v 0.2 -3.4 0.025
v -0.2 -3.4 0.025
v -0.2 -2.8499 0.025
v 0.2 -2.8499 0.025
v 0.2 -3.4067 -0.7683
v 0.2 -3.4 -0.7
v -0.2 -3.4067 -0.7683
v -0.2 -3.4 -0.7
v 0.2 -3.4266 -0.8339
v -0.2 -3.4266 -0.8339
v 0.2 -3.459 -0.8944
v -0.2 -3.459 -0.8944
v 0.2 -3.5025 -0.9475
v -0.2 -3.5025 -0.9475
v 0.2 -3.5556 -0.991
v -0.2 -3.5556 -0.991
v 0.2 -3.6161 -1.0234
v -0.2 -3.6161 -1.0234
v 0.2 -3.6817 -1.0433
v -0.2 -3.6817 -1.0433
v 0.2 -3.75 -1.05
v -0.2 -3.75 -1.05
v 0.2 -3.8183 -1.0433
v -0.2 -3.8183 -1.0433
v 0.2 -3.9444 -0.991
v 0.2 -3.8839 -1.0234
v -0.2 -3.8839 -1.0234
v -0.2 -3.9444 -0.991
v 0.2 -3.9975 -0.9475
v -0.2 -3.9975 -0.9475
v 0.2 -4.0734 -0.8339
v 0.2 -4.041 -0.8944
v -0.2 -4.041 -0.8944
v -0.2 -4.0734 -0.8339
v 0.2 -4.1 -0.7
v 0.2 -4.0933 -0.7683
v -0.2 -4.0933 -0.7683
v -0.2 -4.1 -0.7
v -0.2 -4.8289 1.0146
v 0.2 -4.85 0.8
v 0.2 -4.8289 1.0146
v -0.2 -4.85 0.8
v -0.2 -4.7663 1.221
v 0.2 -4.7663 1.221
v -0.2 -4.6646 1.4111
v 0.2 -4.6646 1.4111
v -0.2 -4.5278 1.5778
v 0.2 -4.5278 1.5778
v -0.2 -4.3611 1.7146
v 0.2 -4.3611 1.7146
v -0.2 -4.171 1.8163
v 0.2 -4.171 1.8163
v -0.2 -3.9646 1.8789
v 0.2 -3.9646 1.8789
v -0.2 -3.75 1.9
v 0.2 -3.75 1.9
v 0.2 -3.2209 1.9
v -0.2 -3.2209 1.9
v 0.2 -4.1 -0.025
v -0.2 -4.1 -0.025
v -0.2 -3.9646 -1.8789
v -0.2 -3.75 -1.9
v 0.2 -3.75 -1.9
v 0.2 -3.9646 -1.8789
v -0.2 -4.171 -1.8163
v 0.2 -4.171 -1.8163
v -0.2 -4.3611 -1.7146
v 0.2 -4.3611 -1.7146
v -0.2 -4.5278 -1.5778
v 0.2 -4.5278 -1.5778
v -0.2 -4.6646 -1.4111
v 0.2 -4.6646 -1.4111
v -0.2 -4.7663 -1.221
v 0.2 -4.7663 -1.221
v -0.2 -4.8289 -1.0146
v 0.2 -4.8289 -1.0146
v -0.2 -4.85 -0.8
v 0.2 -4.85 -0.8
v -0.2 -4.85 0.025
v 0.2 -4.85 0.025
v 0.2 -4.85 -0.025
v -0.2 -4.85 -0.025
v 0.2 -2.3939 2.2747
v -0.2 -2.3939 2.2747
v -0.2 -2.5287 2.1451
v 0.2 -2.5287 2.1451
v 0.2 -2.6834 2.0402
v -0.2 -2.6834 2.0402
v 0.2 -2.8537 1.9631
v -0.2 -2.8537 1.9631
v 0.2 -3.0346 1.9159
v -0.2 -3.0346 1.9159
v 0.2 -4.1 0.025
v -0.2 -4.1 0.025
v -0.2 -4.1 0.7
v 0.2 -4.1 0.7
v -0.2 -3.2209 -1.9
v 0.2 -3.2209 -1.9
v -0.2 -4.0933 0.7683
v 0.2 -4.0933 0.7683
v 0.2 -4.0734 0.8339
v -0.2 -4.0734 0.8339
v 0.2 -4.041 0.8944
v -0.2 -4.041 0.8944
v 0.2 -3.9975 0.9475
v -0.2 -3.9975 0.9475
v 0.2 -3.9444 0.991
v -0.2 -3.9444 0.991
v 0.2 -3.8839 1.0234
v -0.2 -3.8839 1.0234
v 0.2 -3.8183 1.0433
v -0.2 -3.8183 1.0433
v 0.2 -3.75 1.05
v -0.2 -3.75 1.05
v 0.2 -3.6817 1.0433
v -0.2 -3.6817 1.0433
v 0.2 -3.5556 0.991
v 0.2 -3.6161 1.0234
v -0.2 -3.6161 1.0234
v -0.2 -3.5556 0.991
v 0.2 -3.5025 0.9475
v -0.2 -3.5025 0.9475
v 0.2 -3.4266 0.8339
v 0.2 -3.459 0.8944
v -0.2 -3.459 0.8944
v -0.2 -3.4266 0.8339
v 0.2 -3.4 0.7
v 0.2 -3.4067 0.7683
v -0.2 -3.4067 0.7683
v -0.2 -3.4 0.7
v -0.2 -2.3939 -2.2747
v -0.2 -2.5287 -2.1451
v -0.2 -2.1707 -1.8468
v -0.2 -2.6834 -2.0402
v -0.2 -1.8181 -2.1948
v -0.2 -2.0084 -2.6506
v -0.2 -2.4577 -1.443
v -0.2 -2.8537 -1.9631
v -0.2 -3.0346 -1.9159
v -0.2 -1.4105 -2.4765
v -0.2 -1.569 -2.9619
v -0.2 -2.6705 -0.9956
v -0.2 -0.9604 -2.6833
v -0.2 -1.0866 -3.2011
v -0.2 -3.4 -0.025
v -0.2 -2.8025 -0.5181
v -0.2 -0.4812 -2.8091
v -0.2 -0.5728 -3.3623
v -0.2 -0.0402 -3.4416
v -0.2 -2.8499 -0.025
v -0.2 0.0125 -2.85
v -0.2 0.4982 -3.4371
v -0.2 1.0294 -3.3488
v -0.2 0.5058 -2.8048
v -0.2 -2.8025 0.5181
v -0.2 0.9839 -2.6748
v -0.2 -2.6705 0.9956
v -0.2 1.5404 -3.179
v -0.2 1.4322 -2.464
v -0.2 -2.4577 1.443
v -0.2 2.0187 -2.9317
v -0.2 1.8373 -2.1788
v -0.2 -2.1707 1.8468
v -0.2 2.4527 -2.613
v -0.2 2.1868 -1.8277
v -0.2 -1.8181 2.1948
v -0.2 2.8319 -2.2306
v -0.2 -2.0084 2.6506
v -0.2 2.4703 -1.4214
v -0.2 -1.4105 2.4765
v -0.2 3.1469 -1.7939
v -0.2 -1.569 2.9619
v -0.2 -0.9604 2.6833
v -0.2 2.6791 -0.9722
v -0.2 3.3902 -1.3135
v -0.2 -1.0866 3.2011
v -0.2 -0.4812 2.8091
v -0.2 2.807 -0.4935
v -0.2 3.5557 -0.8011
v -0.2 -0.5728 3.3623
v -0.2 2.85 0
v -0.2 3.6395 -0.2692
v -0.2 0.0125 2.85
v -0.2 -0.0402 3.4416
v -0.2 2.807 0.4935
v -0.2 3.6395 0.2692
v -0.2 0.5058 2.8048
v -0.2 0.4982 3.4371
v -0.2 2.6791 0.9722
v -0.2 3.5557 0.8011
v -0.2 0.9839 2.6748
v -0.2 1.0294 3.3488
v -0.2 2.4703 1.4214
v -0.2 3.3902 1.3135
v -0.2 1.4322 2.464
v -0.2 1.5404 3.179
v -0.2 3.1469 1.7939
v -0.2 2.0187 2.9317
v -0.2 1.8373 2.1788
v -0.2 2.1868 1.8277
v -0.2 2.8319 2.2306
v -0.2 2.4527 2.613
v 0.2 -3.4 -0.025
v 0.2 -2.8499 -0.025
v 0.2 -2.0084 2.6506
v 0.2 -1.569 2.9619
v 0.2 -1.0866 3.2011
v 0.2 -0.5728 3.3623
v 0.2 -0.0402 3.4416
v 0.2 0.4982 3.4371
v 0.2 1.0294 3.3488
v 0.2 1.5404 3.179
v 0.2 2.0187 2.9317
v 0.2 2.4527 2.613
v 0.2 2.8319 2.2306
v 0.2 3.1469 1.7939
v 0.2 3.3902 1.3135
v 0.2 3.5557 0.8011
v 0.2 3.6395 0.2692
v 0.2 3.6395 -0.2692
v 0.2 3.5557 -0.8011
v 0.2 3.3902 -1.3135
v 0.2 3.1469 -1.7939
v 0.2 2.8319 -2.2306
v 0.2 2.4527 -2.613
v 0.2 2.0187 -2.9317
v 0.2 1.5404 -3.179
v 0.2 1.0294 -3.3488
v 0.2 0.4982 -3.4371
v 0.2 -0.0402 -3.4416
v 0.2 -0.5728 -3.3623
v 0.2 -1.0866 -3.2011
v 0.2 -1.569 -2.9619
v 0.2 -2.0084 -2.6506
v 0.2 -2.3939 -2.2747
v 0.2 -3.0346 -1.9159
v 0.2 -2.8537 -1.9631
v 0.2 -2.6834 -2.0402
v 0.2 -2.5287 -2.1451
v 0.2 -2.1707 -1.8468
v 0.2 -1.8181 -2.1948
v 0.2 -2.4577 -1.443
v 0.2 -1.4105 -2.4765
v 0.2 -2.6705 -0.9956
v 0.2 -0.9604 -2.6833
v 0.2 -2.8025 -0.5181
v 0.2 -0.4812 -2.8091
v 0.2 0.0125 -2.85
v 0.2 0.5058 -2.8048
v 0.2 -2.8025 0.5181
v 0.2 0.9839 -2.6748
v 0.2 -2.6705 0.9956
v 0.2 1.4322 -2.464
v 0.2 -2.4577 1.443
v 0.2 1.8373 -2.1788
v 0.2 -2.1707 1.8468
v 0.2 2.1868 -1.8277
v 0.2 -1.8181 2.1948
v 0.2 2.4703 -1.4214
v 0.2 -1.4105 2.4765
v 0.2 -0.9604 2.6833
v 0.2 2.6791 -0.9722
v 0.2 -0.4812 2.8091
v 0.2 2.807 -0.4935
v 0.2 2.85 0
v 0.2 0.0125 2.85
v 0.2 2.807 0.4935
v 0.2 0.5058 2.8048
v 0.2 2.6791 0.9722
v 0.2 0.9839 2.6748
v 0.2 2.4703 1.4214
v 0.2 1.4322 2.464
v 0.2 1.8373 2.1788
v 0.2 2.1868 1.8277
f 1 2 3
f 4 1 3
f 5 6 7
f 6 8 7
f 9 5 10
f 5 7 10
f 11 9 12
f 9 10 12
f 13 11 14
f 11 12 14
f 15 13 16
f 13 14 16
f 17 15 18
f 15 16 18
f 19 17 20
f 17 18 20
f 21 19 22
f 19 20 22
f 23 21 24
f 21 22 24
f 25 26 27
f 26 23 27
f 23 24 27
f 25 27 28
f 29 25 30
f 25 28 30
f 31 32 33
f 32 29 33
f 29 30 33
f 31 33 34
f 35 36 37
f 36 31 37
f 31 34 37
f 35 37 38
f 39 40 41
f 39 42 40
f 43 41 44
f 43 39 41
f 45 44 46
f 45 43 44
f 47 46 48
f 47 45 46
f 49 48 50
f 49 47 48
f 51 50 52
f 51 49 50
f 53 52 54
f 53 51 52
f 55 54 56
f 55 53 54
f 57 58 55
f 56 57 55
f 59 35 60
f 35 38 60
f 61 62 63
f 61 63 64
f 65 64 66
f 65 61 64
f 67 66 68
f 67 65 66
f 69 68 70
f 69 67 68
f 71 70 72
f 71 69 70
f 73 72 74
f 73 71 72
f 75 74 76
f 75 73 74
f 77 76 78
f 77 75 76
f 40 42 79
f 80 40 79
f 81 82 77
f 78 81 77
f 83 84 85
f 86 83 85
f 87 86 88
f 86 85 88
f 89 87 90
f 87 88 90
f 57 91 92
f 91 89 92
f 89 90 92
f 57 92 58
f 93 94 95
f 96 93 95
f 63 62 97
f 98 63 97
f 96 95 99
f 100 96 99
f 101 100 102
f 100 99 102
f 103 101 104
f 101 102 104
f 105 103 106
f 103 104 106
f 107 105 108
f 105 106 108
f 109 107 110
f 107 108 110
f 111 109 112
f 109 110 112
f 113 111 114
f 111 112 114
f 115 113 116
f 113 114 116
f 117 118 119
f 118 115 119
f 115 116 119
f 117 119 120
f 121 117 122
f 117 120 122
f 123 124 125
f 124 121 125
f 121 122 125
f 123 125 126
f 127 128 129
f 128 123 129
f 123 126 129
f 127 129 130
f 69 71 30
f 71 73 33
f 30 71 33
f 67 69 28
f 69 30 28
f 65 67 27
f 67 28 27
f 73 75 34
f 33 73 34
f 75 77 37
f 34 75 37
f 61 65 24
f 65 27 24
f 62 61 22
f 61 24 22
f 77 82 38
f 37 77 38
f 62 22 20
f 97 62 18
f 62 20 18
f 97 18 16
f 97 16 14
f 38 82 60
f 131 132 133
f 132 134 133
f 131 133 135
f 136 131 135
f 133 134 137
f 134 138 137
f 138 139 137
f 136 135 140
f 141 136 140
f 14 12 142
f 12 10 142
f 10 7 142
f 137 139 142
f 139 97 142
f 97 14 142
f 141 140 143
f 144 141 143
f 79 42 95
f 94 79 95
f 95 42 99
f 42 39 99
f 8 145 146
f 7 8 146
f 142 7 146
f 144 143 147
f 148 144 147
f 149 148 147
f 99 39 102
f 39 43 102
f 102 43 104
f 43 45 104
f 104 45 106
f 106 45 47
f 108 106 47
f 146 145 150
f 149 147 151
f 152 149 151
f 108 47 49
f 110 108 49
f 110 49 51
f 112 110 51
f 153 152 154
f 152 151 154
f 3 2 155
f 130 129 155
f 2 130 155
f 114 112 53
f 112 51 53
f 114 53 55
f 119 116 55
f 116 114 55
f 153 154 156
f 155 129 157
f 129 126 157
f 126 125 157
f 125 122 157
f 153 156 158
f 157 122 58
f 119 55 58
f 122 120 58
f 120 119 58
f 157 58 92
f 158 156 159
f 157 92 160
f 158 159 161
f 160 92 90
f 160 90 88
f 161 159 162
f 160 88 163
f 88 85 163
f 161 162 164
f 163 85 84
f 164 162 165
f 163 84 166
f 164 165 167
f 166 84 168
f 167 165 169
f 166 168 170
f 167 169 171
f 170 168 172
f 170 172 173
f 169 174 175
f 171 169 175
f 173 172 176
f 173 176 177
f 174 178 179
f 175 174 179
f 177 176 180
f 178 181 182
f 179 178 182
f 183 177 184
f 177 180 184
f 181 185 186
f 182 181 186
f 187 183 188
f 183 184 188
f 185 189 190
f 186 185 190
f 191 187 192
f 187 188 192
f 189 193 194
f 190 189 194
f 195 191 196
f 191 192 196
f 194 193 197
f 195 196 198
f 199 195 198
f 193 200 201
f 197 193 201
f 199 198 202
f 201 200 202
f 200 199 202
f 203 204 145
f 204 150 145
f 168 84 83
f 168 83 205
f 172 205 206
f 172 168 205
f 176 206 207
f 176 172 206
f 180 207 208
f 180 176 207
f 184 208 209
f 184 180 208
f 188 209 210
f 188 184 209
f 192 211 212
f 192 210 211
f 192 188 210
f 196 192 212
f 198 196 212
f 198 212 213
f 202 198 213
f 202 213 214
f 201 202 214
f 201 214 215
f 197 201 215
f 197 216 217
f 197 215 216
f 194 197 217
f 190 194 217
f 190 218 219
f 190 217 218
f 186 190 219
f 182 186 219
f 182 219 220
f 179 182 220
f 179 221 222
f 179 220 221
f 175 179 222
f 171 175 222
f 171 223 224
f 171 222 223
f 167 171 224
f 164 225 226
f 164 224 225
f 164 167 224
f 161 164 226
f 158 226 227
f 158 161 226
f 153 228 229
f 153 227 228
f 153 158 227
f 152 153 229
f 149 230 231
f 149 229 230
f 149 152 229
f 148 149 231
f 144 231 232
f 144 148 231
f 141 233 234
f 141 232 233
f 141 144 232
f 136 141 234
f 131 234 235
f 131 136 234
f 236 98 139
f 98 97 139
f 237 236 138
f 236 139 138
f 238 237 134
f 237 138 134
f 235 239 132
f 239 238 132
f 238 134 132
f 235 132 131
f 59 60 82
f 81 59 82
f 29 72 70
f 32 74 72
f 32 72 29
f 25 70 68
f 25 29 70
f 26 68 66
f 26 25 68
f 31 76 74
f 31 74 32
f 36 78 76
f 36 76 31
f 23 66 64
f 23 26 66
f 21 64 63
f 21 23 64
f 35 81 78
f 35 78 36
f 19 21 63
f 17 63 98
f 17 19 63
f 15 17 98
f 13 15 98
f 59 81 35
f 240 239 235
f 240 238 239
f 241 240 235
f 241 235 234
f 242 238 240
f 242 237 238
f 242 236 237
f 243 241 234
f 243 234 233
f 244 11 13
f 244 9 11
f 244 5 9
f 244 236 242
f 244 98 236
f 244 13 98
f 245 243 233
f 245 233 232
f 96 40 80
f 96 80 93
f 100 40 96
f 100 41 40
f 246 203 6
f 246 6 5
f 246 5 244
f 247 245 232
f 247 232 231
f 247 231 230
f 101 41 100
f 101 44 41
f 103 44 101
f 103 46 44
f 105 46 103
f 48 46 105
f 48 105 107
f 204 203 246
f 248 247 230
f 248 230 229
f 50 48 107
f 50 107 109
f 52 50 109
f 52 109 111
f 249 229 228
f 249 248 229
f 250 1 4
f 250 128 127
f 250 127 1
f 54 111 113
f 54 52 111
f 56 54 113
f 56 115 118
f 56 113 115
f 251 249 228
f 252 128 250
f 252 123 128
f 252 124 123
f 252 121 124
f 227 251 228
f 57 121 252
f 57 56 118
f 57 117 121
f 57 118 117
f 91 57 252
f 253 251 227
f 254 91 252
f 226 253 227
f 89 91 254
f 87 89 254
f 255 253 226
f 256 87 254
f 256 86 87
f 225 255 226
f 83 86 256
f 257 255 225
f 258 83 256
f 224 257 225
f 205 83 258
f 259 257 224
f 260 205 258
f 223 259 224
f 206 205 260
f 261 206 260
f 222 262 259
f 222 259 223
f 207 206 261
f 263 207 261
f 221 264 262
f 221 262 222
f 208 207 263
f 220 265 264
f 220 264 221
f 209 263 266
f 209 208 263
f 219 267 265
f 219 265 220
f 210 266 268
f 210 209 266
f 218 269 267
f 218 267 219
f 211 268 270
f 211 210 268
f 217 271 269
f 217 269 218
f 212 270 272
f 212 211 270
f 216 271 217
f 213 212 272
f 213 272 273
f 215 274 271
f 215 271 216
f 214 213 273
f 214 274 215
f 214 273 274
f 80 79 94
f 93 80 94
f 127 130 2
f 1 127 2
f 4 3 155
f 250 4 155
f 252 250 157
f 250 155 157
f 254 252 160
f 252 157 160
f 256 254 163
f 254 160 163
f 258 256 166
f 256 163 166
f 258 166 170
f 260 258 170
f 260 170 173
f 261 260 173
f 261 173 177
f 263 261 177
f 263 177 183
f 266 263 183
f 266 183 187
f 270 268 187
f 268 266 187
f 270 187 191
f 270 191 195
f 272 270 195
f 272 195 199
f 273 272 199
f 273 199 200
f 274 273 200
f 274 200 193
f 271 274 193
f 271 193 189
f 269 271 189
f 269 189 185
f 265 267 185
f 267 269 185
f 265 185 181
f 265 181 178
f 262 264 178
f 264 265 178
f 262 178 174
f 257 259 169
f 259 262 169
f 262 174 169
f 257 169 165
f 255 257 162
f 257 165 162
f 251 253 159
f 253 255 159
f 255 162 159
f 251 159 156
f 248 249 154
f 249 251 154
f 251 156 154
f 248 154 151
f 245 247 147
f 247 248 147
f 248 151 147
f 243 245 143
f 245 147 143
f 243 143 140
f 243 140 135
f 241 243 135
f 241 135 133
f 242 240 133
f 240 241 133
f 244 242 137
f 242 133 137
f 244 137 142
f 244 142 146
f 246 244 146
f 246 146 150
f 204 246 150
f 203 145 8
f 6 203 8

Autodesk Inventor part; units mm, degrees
sketch "Sketch_5" plane through (0, 0, 0) normal (1, 0, 0) x (0, 1, 0)
  arc A0 (-2.3939, -2.2747) -> (-2.3939, 2.2747) centre (0.2, 0) ccw
  arc A1 (-3.2209, 1.9) -> (-2.3939, 2.2747) centre (-3.2209, 3) ccw
  line L0 (-3.2209, 1.9) -> (-3.75, 1.9)
  arc A2 (-3.75, 1.9) -> (-4.85, 0.8) centre (-3.75, 0.8) ccw
  line L1 (-4.85, 0.8) -> (-4.85, 0.025)
  line L2 (-4.85, 0.025) -> (-4.1, 0.025)
  line L3 (-4.1, 0.025) -> (-4.1, 0.7)
  arc A3 (-3.4, 0.7) -> (-4.1, 0.7) centre (-3.75, 0.7) ccw
  line L4 (-3.4, 0.7) -> (-3.4, 0.025)
  line L5 (-3.4, 0.025) -> (-2.8499, 0.025)
  arc A4 (-2.8499, -0.025) -> (-2.8499, 0.025) centre (0, 0) ccw
  line L6 (-2.8499, -0.025) -> (-3.4, -0.025)
  line L7 (-3.4, -0.025) -> (-3.4, -0.7)
  arc A5 (-4.1, -0.7) -> (-3.4, -0.7) centre (-3.75, -0.7) ccw
  line L8 (-4.1, -0.7) -> (-4.1, -0.025)
  line L9 (-4.1, -0.025) -> (-4.85, -0.025)
  line L10 (-4.85, -0.025) -> (-4.85, -0.8)
  arc A6 (-4.85, -0.8) -> (-3.75, -1.9) centre (-3.75, -0.8) ccw
  line L11 (-3.75, -1.9) -> (-3.2209, -1.9)
  arc A7 (-2.3939, -2.2747) -> (-3.2209, -1.9) centre (-3.2209, -3) ccw
extrude "Extrusion1" add sketch "Sketch_5" along normal mid plane 0.4
ref_plane "1_XY" through (0, 0, 0) normal (1, 0, 0) x (0, 0, -1)
ref_plane "1_YZ" through (0, 0, 0) normal (0, 0, -1) x (0, 1, 0)
ref_plane "1_ZX" through (0, 0, 0) normal (0, 1, 0) x (1, 0, 0)
ref_plane "combination_module_XY" through (0.2, 0, 0) normal (1, 0, 0) x (0, 0, -1)
ref_plane "combination_module_YZ" through (0.2, 0, 0) normal (0, 0, -1) x (0, 1, 0)
ref_plane "combination_module_ZX" through (0.2, 0, 0) normal (0, 1, 0) x (1, 0, 0)
properties part number "SL-STWS6"
